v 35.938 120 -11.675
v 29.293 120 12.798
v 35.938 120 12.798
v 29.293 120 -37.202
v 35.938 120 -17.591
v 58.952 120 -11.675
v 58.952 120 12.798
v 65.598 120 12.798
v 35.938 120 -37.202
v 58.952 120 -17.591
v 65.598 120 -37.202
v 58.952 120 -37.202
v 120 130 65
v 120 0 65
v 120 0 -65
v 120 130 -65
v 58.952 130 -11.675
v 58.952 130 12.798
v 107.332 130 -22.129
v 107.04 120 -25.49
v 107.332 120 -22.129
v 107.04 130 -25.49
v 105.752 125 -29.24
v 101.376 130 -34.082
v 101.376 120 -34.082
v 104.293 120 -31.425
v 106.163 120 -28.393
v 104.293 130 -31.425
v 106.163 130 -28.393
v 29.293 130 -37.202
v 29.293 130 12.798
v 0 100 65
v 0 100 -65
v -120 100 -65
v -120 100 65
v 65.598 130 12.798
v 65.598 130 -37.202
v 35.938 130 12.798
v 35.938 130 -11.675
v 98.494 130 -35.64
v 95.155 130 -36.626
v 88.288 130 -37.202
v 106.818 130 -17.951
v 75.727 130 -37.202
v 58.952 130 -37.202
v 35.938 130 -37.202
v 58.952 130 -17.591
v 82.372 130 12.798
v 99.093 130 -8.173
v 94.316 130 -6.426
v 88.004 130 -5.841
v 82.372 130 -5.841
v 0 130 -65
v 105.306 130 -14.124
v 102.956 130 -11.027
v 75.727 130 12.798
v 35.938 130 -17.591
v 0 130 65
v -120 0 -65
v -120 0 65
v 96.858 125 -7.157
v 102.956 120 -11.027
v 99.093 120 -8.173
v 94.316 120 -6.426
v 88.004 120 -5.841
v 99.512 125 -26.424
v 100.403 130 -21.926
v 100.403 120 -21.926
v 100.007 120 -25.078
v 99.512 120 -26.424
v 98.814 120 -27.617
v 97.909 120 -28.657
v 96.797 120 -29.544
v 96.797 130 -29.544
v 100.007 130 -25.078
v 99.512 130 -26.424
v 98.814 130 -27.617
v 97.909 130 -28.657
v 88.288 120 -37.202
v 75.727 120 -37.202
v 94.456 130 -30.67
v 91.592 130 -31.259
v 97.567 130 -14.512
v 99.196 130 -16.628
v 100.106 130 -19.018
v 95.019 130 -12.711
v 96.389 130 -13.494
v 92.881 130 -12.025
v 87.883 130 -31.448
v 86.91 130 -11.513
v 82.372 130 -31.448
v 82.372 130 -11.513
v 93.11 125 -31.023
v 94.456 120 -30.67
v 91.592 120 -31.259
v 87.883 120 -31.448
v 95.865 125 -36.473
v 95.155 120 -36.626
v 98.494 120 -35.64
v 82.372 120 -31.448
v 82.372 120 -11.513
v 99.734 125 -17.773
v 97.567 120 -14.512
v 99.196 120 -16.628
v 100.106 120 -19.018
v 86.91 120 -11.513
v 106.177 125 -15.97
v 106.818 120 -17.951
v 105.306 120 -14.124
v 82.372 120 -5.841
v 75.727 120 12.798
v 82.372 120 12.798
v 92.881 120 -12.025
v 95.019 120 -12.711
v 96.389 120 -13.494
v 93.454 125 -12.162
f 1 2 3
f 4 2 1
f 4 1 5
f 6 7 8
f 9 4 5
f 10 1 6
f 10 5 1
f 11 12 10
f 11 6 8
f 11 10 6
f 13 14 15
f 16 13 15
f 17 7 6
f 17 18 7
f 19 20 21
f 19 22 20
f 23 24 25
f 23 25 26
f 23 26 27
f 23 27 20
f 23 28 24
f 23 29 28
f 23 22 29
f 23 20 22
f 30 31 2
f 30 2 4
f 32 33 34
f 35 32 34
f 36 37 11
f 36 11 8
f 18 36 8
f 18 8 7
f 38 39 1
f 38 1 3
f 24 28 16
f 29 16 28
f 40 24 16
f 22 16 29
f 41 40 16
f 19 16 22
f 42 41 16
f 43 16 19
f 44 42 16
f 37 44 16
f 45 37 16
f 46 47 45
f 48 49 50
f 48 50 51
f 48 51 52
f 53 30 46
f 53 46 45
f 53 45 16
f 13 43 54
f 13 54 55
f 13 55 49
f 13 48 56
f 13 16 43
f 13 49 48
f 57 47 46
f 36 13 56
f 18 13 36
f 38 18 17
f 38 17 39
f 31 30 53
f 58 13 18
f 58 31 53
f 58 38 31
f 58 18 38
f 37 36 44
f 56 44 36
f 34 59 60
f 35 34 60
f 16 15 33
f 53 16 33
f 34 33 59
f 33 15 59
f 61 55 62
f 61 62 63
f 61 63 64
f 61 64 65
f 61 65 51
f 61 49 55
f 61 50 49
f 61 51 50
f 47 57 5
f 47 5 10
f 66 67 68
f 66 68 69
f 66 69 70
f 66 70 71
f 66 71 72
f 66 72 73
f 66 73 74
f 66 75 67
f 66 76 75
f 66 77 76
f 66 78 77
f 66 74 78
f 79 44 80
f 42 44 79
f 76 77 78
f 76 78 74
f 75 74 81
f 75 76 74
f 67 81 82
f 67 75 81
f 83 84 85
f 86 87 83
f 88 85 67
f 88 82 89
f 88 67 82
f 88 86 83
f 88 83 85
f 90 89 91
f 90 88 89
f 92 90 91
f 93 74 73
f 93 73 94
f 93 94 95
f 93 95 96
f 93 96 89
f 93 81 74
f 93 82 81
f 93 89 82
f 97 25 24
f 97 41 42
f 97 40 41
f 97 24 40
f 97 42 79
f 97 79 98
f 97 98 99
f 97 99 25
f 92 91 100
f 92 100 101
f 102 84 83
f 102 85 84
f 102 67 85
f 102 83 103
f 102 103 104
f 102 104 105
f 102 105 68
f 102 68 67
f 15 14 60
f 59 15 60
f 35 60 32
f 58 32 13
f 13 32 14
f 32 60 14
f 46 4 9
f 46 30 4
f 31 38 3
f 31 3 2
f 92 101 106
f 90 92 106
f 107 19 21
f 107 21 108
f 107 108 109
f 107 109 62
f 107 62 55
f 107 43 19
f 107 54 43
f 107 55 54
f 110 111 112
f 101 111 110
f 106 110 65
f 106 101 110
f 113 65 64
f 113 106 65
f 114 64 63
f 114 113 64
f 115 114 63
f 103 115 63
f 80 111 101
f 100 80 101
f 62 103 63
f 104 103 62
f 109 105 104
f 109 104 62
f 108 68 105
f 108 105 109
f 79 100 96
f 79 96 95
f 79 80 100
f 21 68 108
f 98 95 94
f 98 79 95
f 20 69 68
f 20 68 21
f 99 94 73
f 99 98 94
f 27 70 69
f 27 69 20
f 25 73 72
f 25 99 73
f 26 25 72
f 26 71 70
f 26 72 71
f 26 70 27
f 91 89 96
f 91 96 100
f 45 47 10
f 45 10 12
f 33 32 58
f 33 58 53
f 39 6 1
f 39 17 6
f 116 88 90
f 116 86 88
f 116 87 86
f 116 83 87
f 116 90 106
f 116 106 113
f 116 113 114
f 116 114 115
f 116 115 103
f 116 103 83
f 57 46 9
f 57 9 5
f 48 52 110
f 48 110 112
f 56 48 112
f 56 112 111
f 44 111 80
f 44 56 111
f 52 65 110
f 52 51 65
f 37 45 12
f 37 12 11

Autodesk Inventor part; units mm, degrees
ref_plane "YZ Plane" through (0, 0, 0) normal (1, 0, 0) x (0, 1, 0)
ref_plane "XZ Plane" through (0, 0, 0) normal (0, 1, 0) x (-1, 0, 0)
ref_plane "XY Plane" through (0, 0, 0) normal (0, 0, 1) x (1, 0, 0)
sketch "Sketch1" plane through (0, 0, 0) normal (0, 1, 0) x (-1, 0, 0)
  line L0 (-120, -65) -> (120, -65)
  line L1 (120, -65) -> (120, 65)
  line L2 (120, 65) -> (-120, 65)
  line L3 (-120, 65) -> (-120, -65)
  line L4 (-120, -65) -> (120, 65) construction
  line L5 (120, -65) -> (-120, 65) construction
  line L6 (0, 65) -> (0, -65)
  point P0 (0, 0)
  dimension "d0" = 240
  dimension "d1" = 130
  dimension "d4" = 120
extrude "Extrusion1" add sketch "Sketch1" along normal blind 100
extrude "Extrusion2" add sketch "Sketch1" along normal blind 30 from surface at 100 contours L3 L2 L6 L0
sketch "Sketch2" plane through (0, 130, -65) normal (0, 1, 0) x (1, 0, 0)
  line L0 (24.228, -27.798) -> (40.6948, -27.798) construction
  line L1 (40.6948, -27.798) -> (40.6948, -38.1545) construction
  line L2 (40.6948, -38.1545) -> (24.228, -38.1545) construction
  line L3 (24.228, -38.1545) -> (24.228, -27.798) construction
  line L4 (65.5975, -77.798) -> (58.9525, -77.798)
  line L5 (58.9525, -77.798) -> (58.9525, -53.3247)
  line L6 (58.9525, -53.3247) -> (35.9379, -53.3247)
  line L7 (35.9379, -53.3247) -> (35.9379, -77.798)
  line L8 (35.9379, -77.798) -> (29.2928, -77.798)
  line L9 (29.2928, -77.798) -> (29.2928, -27.798)
  line L10 (29.2928, -27.798) -> (35.9379, -27.798)
  line L11 (35.9379, -27.798) -> (35.9379, -47.409)
  line L12 (35.9379, -47.409) -> (58.9525, -47.409)
  line L13 (58.9525, -47.409) -> (58.9525, -27.798)
  line L14 (58.9525, -27.798) -> (65.5975, -27.798)
  line L15 (65.5975, -27.798) -> (65.5975, -77.798)
  spline S0 degree 2 poles (107.3317, -42.8709) (107.3317, -46.1124) (105.0222, -51.9471) (102.9557, -53.973) knots 0 0 0 1 2 2 2
  spline S1 degree 2 poles (102.9557, -53.973) (100.3625, -56.5257) (93.3528, -59.1594) (88.0043, -59.1594) knots 0 0 0 1 2 2 2
  line L16 (88.0043, -59.1594) -> (82.3723, -59.1594)
  line L17 (82.3723, -59.1594) -> (82.3723, -77.798)
  line L18 (82.3723, -77.798) -> (75.7272, -77.798)
  line L19 (75.7272, -77.798) -> (75.7272, -27.798)
  line L20 (75.7272, -27.798) -> (88.288, -27.798)
  spline S2 degree 2 poles (88.288, -27.798) (92.745, -27.798) (98.9849, -29.2566) (101.3755, -30.9179) knots 0 0 0 1 2 2 2
  spline S3 degree 2 poles (101.3755, -30.9179) (104.1713, -32.8223) (107.3317, -38.6975) (107.3317, -42.8709) knots 0 0 0 1 2 2 2
  spline S4 degree 2 poles (100.403, -43.0735) (100.403, -40.4803) (98.6202, -36.6715) (96.7969, -35.456) knots 0 0 0 1 2 2 2
  spline S5 degree 2 poles (96.7969, -35.456) (95.2167, -34.4025) (91.0027, -33.5516) (87.8828, -33.5516) knots 0 0 0 1 2 2 2
  line L21 (87.8828, -33.5516) -> (82.3723, -33.5516)
  line L22 (82.3723, -33.5516) -> (82.3723, -53.4868)
  line L23 (82.3723, -53.4868) -> (86.9103, -53.4868)
  spline S6 degree 2 poles (86.9103, -53.4868) (90.9622, -53.4868) (95.946, -52.1902) (97.5667, -50.4884) knots 0 0 0 1 2 2 2
  spline S7 degree 2 poles (97.5667, -50.4884) (99.0659, -48.9892) (100.403, -45.4641) (100.403, -43.0735) knots 0 0 0 1 2 2 2
  point P0 (0, -65)
  point P1 (67.1766, -110.0367)
extrude "Extrusion3" cut sketch "Sketch2" against normal blind 10
properties part number "HotPlate"
